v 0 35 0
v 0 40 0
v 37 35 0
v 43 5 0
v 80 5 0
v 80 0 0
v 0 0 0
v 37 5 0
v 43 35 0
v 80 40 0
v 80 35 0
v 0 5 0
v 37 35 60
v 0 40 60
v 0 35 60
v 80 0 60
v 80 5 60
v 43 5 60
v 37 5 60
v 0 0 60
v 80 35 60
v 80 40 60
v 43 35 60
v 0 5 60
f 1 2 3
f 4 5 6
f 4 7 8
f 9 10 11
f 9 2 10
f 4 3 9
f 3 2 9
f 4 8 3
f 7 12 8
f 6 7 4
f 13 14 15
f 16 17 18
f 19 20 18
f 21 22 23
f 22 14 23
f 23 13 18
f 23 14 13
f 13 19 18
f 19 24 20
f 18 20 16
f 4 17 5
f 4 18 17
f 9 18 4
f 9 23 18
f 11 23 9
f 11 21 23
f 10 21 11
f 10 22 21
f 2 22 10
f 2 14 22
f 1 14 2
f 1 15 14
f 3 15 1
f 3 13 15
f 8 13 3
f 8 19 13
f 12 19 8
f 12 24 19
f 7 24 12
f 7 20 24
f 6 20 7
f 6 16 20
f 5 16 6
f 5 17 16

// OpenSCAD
$fn = 32;

// ----------------------------------------------------------------------
// Structural section: ibeam 80 x 40 mm
// ----------------------------------------------------------------------

// --- parameters (mm) ---
sec_w = 80;               // section width, X
sec_h = 40;               // section height, Y
flange_t = 5;             // flange thickness
web_t = 6;                // web thickness
plate_t = 60;             // cut length, Z (extrusion height)
fit_tol = 0.05;           // declared fit tolerance (prompt contract)
free_tol = 0.3;           // declared free tolerance (prompt contract)

profile = [[0, 0], [80, 0], [80, 5], [43, 5], [43, 35], [80, 35], [80, 40], [0, 40], [0, 35], [37, 35], [37, 5], [0, 5]];  // primary outline, 12 points, counter clockwise

// --- the one profile operation ---
linear_extrude(height = plate_t) polygon(points = profile);
